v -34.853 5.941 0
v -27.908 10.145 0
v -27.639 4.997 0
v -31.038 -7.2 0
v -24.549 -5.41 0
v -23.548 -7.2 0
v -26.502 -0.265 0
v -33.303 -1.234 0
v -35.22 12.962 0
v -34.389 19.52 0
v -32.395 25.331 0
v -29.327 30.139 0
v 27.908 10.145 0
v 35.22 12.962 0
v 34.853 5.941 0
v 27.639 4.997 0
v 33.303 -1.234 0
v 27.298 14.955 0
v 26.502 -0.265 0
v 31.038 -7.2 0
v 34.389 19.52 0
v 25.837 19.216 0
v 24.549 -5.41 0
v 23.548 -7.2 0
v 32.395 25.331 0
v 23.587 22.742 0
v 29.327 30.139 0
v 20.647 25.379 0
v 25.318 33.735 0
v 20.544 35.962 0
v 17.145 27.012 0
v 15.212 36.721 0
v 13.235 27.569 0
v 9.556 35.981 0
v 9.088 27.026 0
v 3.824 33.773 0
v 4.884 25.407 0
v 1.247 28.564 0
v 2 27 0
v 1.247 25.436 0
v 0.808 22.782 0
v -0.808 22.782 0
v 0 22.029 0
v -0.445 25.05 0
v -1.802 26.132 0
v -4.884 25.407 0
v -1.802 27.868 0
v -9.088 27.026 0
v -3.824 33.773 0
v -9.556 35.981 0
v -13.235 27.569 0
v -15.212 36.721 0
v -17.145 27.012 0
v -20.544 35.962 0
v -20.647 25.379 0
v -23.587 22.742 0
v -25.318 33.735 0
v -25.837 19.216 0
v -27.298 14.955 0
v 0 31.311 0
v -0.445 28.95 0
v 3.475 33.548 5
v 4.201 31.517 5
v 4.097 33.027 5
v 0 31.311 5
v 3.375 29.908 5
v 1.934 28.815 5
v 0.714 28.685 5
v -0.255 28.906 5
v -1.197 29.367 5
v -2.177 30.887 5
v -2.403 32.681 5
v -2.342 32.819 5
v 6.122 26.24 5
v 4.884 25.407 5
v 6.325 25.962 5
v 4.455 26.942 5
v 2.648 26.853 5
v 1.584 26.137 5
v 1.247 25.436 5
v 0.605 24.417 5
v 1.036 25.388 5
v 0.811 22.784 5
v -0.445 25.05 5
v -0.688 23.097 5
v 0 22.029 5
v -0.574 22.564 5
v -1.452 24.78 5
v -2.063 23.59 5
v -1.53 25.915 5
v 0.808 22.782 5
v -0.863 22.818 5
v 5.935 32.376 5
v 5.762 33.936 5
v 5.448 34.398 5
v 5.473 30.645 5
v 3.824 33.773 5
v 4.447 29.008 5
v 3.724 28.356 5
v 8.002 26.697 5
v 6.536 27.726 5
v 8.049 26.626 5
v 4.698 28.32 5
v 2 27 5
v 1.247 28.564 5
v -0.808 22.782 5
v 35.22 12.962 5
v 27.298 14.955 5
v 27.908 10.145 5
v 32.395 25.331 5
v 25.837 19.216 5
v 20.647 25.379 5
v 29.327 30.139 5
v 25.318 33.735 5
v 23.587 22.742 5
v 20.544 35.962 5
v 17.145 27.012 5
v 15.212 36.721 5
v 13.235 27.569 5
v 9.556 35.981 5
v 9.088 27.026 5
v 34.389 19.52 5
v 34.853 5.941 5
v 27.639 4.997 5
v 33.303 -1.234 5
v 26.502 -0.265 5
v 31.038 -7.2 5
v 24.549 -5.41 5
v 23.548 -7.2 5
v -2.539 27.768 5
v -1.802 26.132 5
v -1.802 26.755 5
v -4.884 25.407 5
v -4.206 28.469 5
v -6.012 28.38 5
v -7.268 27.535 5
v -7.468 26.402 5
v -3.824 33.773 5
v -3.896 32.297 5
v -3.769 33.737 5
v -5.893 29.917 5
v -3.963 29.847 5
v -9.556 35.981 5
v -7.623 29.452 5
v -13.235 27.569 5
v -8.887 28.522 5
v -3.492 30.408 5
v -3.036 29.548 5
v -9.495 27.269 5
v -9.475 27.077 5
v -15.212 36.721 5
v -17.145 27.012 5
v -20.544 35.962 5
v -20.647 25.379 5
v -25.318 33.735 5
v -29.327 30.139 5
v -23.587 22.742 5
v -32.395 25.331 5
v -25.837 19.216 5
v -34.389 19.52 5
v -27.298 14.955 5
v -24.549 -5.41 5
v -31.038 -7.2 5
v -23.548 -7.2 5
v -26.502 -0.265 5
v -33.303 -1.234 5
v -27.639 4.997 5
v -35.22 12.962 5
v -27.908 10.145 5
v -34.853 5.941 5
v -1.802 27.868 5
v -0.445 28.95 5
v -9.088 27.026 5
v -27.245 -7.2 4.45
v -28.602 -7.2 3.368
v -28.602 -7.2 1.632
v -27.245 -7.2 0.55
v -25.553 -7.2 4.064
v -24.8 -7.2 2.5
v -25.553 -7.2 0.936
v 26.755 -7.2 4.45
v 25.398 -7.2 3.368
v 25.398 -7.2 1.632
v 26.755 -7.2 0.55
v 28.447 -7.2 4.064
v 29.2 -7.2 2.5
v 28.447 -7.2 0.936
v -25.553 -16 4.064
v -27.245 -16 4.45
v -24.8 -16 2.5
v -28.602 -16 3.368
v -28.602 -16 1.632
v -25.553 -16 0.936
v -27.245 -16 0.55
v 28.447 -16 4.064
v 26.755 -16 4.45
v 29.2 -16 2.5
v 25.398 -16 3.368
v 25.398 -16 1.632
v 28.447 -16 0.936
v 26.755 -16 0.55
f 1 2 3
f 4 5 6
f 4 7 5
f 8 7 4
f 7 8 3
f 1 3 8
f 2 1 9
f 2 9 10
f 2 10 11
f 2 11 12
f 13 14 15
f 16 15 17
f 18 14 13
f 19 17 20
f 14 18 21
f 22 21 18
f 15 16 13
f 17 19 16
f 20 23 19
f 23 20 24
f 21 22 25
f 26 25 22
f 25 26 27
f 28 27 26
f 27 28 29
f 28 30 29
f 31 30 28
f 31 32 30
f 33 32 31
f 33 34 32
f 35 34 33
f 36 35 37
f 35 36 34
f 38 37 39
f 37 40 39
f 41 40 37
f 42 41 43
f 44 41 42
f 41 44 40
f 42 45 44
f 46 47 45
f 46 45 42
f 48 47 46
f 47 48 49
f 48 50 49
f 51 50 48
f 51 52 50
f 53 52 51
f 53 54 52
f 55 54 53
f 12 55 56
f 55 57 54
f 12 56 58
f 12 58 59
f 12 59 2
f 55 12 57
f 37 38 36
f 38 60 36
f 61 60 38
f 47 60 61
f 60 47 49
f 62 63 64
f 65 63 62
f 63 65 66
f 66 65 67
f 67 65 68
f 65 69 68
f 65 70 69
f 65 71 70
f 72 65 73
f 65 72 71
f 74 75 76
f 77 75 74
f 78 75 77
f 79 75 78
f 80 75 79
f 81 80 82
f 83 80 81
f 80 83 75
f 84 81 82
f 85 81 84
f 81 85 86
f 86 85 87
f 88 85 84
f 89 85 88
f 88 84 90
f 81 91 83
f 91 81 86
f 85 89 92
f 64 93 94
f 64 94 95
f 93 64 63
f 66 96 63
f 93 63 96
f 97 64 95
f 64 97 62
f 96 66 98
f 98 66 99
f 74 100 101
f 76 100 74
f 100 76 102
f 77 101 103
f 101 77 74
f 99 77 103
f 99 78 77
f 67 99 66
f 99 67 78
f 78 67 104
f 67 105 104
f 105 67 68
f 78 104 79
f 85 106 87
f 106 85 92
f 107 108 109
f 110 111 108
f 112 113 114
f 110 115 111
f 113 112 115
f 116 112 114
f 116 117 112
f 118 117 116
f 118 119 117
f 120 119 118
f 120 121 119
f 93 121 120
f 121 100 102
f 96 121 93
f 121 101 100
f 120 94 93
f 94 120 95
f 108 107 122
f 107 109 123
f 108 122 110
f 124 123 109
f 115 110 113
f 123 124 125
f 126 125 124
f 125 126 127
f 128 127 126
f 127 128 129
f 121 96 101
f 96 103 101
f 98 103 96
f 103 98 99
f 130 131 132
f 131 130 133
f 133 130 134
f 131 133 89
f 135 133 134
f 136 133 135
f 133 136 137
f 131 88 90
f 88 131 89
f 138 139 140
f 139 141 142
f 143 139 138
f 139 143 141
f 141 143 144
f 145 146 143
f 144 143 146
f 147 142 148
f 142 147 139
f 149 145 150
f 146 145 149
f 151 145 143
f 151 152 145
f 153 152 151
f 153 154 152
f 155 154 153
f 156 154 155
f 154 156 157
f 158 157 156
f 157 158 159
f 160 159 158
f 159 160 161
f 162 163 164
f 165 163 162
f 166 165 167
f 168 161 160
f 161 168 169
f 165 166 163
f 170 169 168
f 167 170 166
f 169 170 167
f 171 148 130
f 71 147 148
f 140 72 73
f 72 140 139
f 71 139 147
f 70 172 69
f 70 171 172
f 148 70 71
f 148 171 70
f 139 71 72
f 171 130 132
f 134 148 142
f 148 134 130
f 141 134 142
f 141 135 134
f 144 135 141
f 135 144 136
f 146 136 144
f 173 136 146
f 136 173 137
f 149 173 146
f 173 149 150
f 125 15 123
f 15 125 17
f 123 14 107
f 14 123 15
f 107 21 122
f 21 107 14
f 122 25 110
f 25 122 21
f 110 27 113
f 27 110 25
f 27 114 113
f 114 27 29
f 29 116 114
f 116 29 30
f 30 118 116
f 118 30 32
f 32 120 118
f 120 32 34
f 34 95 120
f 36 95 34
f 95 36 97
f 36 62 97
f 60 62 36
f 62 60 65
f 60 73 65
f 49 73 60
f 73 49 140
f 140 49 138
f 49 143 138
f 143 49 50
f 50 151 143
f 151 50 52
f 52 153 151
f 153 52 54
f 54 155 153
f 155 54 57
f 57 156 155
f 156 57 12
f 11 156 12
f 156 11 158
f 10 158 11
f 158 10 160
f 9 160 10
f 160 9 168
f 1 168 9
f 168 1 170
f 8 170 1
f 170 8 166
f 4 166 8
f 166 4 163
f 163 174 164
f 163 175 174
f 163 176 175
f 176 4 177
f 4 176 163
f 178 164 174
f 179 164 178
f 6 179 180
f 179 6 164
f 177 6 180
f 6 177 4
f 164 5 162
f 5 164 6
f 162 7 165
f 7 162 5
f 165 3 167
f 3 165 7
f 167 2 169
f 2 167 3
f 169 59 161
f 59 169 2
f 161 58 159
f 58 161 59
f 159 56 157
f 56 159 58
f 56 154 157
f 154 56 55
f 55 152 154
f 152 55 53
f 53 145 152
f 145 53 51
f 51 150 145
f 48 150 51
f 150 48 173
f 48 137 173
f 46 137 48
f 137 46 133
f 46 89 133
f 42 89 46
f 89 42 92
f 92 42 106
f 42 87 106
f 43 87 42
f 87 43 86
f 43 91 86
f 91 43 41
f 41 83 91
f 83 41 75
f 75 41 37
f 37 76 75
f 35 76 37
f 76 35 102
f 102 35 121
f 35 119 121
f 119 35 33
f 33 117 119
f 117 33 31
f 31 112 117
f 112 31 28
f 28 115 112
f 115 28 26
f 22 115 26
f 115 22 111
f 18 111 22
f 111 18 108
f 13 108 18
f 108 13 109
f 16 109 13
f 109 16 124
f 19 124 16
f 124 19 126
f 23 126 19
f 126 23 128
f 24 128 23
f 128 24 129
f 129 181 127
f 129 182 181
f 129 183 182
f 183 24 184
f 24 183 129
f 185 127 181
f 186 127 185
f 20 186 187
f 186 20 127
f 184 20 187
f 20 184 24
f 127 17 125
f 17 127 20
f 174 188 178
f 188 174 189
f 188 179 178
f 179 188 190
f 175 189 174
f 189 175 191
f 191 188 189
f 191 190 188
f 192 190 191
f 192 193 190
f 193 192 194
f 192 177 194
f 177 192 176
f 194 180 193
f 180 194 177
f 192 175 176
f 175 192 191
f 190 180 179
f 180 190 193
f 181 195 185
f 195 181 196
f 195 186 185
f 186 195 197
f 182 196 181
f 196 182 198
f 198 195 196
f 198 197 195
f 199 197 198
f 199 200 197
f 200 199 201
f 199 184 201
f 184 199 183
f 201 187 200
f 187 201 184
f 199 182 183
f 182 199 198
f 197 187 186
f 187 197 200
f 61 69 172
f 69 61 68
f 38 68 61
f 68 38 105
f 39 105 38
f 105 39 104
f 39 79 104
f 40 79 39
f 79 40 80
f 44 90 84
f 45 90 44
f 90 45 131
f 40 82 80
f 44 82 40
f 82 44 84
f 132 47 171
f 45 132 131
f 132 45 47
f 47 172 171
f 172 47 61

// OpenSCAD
module standbase() {
  // base
  cube([170, 80, 5]);

  // steps
  intersection(){
    union() {
      union() {
        translate([85, 100, 5]){
          cylinder(r=60, h=1);
        }
        translate([0, 120, 5]){
          cylinder(r=80, h=1);
        }
        translate([170, 120, 5]){
          cylinder(r=80, h=1);
        }
      }
      union() {
        translate([85, 100, 6]){
          cylinder(r=58, h=1);
        }
        translate([0, 120, 6]){
          cylinder(r=78, h=1);
        }
        translate([170, 120, 6]){
          cylinder(r=78, h=1);
        }
      }
      translate([85, 100, 7]){
        cylinder(r=56, h=1);
      }
      translate([85, 100, 8]){
        cylinder(r=54, h=1);
      }
    }
    translate([0, 0, 5]) {
      cube([170, 80, 5]);
    }
  }
}

module mainDisplay() {
  difference() {
    // base
    cube([55, 25, 3]);
    // minus
    translate([1, 1, 2]) {
      cube([53, 23, 1]);
    }
  }
  translate([7, -10, 0]) {
    cube([3, 10, 3]);
  }
  translate([45, -10, 0]) {
    cube([3, 10, 3]);
  }
}

module bardeco() {
  difference() {
    // base
    cube([8, 27, 2]);
    // minus
    translate([2, 0, 1]){
      cube([1, 27, 1]);
    }
    translate([5, 0, 1]){
      cube([1, 27, 1]);
    }
  }
  translate([0, -9, 0]) {
    cube([2, 9, 2]);
  }
  translate([6, -9, 0]) {
    cube([2, 9, 2]);
  }
}

module bigheart2d() {
  difference() {
    // base
    union() {
      rotate([0, 0, 25]) {
        scale([0.7, 1, 1]) {
          circle(r=30);
        }
      }
      translate([13, 0, 0]){
        rotate([0, 0, -25]) {
          scale([0.7, 1, 1]) {
            circle(r=30);
          }
        }
      }
    }
    // minus
    union() {
      rotate([0, 0, 25]) {
        scale([0.7, 1, 1]) {
          circle(r=22);
        }
      }
      translate([13, 0, 0]){
        rotate([0, 0, -25]) {
          scale([0.7, 1, 1]) {
            circle(r=22);
          }
        }
      }
    }
    translate([7, -23, 0]) {
      square(size=[60, 30], center=true);
    }
  }
}

module bigheart3d() {
  linear_extrude(height=5) {
    scale([1.2, 1.2, 1.2]){
      translate([0, 2, 0]) {
        bigheart2d();
      }
    }
  }
  translate([-19, -7, 2.5]) {
    rotate([90, 0, 0]) {
      cylinder(h=9 ,r=2);
    }
  }
  translate([35, -7, 2.5]) {
    rotate([90, 0, 0]) {
      cylinder(h=9 ,r=2);
    }
  }
}

module heart2d() {
  difference() {
    union() {
      translate([-1, 0, 0]) {
        rotate([0, 0, 30]) {
          scale([0.7, 1, 1]) {
            circle(r=5);
          }
        }
      }
      translate([1, 0, 0]) {
        rotate([0, 0, -30]) {
          scale([0.7, 1, 1]) {
            circle(r=5);
          }
        }
      }
    }
    union() {
      translate([-1, 0, 0]) {
        rotate([0, 0, 30]) {
          scale([0.7, 1, 1]) {
            circle(r=3);
          }
        }
      }
      translate([1, 0, 0]) {
        rotate([0, 0, -30]) {
          scale([0.7, 1, 1]) {
            circle(r=3);
          }
        }
      }
    }
  }
}

module clover2d() {
  for (deg = [0:120:240]) {
    rotate([0, 0, deg]) {
      translate([0, 4.5, 0]) {
        heart2d();
      }
    }
    
  }
}

module clover3d() {
  linear_extrude(height=2) {
    clover2d();
  }
}

module logo() {
  rotate([0, 0, -10]) {
    clover3d();
  }
  translate([0, 0, 2]) {
    rotate([0, 0, 10]) {
      clover3d();
    }
  }
  translate([0, 0, -2.5]) {
    cylinder(r=2, h=5, center=true);
  }
}

module petitDisplay() {
  difference() {
    cube([35, 15, 2]);
    translate([1, 1, 1]) {
      cube([33, 13, 1]);
    }
  }
}

module sidedeco() {
  translate([2.5, 3, 3]) {
    petitDisplay();
  }
  for(x = [0:37/5:37]) {
    translate([x, -4, 0]) {
      if (x == 0 || x == 37){
        translate([0, -7, 0]) {
          cube([3, 32, 3]);
        }
      } else {
        cube([3, 25, 3]);
      }
    }
  }
  translate([0, 21, 0]) {
    cube([40, 3, 5]);
  }
}

module groove() {
  rotate([0, 0, 6]) {
    linear_extrude(height=2){
      difference() {
        circle(r=200, $fn=30);
        circle(r=189);
      }
    }
  }
}

module backdeco() {
  difference() {
    translate([-7.8, 0, 0]) {
      bigheart3d();
    }
    translate([0, 27, 5]) {
      logo();
    }
  }
}

// !backdeco();

// main render
// difference() {
  color("#2f2f2f"){
    difference() {
      standbase();
      translate([85, -160, 3]){
        groove();
      }
    }
  }

  color("#88ddff"){
    translate([57.5, 68, 10]){
      rotate([90, 0, 0]){
        mainDisplay();
      }
    }
  }

  color("#ff88aa"){
    translate([46, 69, 9]) {
      rotate([90, 0, 0]){
        bardeco();
      }
    }
    translate([116, 69, 9]) {
      rotate([90, 0, 0]){
        bardeco();
      }
    }
  }

  color("#eedd55"){
    translate([85, 78, 17]){
    // translate([0, -50, 14]){
      rotate([90, 0, 0]) {
        backdeco();
      }
    }
  }

  color("#00ff55"){
    translate([85, 73, 44]) {
      rotate([90, 0, 0]) {
        logo();
      }
      
    }
  }

  color("#5577ff") {
    translate([0.5, 55, 11]) {
      rotate([90, 0, 15]) {
        sidedeco();
      }
    }
    translate([130, 65, 11]) {
      rotate([90, 0, -15]) {
        sidedeco();
      }
    }
  }
// }

*mainDisplay();
*bardeco();
!backdeco();
*logo();
*sidedeco();
